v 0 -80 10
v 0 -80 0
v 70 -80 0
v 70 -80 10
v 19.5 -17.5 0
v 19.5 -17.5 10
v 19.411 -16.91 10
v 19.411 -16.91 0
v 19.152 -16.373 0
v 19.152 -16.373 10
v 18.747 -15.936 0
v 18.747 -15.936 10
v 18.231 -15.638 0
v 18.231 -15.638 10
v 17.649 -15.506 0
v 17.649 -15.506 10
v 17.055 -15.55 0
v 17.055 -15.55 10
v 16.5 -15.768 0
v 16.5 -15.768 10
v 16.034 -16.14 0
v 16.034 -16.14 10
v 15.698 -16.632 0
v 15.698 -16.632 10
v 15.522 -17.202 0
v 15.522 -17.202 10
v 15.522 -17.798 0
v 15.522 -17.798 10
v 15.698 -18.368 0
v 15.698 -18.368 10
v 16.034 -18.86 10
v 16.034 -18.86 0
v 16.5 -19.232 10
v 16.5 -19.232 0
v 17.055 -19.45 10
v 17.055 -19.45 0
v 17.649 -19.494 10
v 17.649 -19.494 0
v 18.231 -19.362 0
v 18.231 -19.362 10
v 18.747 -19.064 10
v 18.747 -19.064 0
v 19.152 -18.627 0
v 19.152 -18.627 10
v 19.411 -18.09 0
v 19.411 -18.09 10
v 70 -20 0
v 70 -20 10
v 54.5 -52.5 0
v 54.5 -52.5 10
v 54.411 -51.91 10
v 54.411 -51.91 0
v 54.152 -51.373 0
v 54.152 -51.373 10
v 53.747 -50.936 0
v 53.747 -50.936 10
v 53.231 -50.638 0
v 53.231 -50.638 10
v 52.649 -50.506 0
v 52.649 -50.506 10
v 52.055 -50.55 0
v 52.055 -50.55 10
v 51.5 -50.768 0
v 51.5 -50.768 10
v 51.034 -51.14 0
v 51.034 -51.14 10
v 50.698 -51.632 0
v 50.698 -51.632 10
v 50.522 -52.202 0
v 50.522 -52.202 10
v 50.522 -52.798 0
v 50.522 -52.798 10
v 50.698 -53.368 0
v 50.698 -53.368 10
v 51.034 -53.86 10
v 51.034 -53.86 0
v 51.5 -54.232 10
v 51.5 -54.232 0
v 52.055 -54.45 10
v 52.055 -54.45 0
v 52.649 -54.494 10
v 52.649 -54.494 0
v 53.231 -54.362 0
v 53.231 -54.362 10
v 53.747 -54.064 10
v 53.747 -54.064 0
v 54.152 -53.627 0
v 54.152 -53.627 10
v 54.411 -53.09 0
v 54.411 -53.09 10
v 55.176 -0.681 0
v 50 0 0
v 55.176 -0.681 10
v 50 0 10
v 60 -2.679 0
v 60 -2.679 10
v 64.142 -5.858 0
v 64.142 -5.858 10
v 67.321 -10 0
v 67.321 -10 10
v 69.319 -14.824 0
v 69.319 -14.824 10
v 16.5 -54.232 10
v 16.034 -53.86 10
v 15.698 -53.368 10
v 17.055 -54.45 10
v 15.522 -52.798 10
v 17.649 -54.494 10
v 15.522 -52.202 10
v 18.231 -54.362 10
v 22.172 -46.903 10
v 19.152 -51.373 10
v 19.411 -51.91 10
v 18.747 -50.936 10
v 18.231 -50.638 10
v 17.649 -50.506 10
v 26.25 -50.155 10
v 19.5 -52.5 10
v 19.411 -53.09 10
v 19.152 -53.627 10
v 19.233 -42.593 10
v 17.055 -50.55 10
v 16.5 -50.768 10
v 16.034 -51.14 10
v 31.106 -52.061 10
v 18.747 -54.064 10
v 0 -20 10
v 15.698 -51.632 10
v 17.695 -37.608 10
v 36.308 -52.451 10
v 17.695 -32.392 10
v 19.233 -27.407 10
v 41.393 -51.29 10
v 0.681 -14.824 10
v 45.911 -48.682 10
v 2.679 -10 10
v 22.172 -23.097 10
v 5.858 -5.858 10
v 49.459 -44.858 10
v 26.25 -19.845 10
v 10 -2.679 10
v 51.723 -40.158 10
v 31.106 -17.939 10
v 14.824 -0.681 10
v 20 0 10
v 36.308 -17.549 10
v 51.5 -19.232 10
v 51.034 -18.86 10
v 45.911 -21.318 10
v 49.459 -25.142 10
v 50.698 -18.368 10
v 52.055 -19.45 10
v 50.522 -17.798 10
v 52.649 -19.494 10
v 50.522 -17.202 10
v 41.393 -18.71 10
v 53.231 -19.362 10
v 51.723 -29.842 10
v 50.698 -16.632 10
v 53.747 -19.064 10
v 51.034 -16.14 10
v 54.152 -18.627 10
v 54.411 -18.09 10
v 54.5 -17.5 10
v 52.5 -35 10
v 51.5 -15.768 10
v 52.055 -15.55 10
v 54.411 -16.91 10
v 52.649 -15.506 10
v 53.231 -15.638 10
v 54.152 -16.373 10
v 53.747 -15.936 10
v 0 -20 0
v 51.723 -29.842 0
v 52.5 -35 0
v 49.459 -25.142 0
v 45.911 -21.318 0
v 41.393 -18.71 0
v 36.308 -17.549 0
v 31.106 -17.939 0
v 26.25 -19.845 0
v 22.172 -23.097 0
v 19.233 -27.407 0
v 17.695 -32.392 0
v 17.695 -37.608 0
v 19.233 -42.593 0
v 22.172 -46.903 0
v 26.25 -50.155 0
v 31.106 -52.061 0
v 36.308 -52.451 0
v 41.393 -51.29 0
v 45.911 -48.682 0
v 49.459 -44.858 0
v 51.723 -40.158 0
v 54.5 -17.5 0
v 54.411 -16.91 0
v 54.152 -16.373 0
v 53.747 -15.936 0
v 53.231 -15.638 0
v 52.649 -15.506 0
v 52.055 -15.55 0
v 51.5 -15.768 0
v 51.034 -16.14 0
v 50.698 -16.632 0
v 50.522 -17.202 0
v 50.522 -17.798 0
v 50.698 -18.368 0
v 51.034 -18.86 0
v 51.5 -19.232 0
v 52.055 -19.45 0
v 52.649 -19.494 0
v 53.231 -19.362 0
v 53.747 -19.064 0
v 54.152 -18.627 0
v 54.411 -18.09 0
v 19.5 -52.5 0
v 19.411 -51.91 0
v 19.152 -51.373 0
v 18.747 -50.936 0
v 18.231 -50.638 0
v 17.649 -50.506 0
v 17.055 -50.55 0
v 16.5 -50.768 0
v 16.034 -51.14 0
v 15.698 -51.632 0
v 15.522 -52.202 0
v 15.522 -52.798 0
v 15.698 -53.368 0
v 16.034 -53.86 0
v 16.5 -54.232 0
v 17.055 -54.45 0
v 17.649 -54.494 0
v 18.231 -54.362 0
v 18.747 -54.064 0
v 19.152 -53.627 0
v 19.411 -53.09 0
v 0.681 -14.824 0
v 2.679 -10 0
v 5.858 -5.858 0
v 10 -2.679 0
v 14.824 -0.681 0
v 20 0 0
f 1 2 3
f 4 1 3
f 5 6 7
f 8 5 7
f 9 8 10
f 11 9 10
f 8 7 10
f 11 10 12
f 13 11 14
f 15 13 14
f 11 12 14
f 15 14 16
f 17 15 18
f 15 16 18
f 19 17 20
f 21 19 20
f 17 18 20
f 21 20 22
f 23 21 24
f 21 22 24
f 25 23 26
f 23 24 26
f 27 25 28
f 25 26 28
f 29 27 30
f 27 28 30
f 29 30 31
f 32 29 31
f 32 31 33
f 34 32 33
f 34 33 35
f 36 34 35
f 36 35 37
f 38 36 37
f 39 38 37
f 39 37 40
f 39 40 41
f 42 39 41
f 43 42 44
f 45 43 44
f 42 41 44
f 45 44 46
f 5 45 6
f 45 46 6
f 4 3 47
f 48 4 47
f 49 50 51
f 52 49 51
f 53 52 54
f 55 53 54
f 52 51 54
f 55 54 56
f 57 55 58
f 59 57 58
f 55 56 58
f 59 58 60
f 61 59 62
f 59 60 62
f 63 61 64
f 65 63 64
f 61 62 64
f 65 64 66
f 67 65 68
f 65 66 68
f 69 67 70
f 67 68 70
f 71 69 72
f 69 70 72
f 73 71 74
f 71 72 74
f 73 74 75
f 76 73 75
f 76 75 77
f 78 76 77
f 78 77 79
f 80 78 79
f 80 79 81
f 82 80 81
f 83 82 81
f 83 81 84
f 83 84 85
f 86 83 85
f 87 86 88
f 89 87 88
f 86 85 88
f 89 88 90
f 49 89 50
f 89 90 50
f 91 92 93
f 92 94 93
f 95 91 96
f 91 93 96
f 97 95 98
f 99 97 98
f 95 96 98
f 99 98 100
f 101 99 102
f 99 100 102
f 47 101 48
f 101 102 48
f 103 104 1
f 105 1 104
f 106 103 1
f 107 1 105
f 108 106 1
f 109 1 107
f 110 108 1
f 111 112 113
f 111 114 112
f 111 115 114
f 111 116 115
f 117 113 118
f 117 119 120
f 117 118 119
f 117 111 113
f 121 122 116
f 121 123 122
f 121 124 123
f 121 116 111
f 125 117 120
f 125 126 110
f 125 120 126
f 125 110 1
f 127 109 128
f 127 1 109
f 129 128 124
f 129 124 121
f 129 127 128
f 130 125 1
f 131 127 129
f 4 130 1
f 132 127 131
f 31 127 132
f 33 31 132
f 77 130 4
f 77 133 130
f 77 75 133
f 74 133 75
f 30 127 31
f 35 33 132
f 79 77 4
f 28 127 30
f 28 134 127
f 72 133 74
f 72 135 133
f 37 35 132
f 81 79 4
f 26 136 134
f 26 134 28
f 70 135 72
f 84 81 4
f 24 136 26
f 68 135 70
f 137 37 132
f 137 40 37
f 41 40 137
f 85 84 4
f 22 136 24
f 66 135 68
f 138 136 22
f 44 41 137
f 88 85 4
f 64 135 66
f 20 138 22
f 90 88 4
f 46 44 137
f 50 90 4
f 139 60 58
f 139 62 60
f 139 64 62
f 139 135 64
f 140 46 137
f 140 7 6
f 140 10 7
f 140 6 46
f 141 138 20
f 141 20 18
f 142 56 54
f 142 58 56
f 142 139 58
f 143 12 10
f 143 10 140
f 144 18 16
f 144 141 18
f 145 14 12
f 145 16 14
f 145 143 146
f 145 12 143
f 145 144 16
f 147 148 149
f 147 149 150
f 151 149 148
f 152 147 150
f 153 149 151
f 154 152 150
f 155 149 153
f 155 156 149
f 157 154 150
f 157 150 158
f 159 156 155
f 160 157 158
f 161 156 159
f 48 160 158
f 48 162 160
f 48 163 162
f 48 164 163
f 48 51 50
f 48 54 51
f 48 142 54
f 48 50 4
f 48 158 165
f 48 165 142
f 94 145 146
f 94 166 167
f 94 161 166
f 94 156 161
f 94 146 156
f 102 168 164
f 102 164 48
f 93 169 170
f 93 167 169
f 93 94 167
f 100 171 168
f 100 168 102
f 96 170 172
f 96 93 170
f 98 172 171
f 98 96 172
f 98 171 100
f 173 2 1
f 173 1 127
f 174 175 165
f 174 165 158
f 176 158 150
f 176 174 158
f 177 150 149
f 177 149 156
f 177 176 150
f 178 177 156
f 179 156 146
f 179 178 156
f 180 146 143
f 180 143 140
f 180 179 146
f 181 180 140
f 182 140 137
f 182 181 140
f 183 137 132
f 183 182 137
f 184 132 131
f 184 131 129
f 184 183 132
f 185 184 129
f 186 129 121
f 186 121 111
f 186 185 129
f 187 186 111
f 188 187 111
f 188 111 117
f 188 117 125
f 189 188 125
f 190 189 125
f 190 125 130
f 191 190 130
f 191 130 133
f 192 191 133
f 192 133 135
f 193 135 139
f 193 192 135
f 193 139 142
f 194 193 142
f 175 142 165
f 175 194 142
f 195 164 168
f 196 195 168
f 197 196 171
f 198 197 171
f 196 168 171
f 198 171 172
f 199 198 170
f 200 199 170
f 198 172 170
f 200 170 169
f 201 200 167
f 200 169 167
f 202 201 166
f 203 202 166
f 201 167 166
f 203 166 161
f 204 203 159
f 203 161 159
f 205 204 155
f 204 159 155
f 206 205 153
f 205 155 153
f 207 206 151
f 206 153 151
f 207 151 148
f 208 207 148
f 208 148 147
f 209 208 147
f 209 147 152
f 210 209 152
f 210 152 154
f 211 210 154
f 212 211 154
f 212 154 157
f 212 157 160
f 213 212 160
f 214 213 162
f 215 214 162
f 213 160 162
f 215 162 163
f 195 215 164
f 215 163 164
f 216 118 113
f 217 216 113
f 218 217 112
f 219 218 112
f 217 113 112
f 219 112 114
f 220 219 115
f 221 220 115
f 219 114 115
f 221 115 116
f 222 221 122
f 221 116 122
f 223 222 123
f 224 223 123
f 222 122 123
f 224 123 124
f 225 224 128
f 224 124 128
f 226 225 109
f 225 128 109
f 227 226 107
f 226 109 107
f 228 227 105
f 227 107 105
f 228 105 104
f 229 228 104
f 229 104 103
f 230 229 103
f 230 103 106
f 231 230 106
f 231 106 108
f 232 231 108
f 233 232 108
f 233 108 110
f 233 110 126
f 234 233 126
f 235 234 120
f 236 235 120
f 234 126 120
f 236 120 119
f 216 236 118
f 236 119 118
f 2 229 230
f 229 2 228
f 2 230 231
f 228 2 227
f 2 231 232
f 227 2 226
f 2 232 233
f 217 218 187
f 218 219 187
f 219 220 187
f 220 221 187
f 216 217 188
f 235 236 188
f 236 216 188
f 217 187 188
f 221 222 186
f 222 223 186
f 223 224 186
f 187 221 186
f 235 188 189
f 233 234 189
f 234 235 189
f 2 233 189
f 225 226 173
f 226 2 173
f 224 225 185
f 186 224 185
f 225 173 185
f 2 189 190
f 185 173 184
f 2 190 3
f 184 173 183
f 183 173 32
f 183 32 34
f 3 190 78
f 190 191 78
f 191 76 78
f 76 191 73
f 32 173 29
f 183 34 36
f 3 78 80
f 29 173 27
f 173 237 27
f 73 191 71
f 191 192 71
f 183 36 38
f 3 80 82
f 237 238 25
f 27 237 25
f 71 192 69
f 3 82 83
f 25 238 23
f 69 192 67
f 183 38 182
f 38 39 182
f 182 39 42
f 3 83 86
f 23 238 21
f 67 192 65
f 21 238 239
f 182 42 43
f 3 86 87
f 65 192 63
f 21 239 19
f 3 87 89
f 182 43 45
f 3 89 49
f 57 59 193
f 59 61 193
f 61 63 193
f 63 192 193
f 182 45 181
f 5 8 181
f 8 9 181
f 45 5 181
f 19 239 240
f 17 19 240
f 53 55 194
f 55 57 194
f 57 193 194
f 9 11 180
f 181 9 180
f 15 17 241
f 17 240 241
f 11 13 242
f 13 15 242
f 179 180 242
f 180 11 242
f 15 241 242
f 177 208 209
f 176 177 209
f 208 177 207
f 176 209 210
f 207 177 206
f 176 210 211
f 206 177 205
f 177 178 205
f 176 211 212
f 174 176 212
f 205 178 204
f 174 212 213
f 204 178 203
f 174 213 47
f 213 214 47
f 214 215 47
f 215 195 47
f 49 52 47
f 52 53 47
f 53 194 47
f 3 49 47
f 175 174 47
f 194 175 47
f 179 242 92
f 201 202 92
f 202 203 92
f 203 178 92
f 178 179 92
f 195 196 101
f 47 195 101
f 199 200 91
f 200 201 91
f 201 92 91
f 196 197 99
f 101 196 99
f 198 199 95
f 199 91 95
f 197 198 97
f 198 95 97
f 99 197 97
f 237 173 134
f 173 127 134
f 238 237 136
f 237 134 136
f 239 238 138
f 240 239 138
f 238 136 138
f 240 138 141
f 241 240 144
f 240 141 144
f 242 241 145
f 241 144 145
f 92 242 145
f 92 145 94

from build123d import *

# Parameters (mm, degrees)
SKETCH1_W           = 70
SKETCH1_H           = 80
SKETCH1_R           = 17.5
BOSS_EXTRUDE1_DEPTH = 10
FILLET1_R           = 20
SKETCH2_R           = 2
CUT_EXTRUDE1_DEPTH  = 10


with BuildPart() as part:
    # Sketch1 → Boss-Extrude1 (new body)
    with BuildSketch(Plane.XY):
        with Locations((35, -40)):
            Rectangle(SKETCH1_W, SKETCH1_H)
        with Locations((35, -35)):
            Circle(SKETCH1_R, mode=Mode.SUBTRACT)
    extrude(amount=BOSS_EXTRUDE1_DEPTH)

    # Fillet1
    fillet1_edges = [part.edges().sort_by_distance(p)[0] for p in [
        (0, 0, 5),
        (70, 0, 5),
    ]]
    fillet(fillet1_edges, radius=FILLET1_R)

    # Sketch2 → Cut-Extrude1 (cut)
    with BuildSketch(Plane.XY.offset(10)):
        with Locations((17.5, -17.5)):
            Circle(SKETCH2_R)
        with Locations((52.5, -17.5)):
            Circle(SKETCH2_R)
        with Locations((52.5, -52.5)):
            Circle(SKETCH2_R)
        with Locations((17.5, -52.5)):
            Circle(SKETCH2_R)
    extrude(amount=-CUT_EXTRUDE1_DEPTH, mode=Mode.SUBTRACT)


solid = part.part
